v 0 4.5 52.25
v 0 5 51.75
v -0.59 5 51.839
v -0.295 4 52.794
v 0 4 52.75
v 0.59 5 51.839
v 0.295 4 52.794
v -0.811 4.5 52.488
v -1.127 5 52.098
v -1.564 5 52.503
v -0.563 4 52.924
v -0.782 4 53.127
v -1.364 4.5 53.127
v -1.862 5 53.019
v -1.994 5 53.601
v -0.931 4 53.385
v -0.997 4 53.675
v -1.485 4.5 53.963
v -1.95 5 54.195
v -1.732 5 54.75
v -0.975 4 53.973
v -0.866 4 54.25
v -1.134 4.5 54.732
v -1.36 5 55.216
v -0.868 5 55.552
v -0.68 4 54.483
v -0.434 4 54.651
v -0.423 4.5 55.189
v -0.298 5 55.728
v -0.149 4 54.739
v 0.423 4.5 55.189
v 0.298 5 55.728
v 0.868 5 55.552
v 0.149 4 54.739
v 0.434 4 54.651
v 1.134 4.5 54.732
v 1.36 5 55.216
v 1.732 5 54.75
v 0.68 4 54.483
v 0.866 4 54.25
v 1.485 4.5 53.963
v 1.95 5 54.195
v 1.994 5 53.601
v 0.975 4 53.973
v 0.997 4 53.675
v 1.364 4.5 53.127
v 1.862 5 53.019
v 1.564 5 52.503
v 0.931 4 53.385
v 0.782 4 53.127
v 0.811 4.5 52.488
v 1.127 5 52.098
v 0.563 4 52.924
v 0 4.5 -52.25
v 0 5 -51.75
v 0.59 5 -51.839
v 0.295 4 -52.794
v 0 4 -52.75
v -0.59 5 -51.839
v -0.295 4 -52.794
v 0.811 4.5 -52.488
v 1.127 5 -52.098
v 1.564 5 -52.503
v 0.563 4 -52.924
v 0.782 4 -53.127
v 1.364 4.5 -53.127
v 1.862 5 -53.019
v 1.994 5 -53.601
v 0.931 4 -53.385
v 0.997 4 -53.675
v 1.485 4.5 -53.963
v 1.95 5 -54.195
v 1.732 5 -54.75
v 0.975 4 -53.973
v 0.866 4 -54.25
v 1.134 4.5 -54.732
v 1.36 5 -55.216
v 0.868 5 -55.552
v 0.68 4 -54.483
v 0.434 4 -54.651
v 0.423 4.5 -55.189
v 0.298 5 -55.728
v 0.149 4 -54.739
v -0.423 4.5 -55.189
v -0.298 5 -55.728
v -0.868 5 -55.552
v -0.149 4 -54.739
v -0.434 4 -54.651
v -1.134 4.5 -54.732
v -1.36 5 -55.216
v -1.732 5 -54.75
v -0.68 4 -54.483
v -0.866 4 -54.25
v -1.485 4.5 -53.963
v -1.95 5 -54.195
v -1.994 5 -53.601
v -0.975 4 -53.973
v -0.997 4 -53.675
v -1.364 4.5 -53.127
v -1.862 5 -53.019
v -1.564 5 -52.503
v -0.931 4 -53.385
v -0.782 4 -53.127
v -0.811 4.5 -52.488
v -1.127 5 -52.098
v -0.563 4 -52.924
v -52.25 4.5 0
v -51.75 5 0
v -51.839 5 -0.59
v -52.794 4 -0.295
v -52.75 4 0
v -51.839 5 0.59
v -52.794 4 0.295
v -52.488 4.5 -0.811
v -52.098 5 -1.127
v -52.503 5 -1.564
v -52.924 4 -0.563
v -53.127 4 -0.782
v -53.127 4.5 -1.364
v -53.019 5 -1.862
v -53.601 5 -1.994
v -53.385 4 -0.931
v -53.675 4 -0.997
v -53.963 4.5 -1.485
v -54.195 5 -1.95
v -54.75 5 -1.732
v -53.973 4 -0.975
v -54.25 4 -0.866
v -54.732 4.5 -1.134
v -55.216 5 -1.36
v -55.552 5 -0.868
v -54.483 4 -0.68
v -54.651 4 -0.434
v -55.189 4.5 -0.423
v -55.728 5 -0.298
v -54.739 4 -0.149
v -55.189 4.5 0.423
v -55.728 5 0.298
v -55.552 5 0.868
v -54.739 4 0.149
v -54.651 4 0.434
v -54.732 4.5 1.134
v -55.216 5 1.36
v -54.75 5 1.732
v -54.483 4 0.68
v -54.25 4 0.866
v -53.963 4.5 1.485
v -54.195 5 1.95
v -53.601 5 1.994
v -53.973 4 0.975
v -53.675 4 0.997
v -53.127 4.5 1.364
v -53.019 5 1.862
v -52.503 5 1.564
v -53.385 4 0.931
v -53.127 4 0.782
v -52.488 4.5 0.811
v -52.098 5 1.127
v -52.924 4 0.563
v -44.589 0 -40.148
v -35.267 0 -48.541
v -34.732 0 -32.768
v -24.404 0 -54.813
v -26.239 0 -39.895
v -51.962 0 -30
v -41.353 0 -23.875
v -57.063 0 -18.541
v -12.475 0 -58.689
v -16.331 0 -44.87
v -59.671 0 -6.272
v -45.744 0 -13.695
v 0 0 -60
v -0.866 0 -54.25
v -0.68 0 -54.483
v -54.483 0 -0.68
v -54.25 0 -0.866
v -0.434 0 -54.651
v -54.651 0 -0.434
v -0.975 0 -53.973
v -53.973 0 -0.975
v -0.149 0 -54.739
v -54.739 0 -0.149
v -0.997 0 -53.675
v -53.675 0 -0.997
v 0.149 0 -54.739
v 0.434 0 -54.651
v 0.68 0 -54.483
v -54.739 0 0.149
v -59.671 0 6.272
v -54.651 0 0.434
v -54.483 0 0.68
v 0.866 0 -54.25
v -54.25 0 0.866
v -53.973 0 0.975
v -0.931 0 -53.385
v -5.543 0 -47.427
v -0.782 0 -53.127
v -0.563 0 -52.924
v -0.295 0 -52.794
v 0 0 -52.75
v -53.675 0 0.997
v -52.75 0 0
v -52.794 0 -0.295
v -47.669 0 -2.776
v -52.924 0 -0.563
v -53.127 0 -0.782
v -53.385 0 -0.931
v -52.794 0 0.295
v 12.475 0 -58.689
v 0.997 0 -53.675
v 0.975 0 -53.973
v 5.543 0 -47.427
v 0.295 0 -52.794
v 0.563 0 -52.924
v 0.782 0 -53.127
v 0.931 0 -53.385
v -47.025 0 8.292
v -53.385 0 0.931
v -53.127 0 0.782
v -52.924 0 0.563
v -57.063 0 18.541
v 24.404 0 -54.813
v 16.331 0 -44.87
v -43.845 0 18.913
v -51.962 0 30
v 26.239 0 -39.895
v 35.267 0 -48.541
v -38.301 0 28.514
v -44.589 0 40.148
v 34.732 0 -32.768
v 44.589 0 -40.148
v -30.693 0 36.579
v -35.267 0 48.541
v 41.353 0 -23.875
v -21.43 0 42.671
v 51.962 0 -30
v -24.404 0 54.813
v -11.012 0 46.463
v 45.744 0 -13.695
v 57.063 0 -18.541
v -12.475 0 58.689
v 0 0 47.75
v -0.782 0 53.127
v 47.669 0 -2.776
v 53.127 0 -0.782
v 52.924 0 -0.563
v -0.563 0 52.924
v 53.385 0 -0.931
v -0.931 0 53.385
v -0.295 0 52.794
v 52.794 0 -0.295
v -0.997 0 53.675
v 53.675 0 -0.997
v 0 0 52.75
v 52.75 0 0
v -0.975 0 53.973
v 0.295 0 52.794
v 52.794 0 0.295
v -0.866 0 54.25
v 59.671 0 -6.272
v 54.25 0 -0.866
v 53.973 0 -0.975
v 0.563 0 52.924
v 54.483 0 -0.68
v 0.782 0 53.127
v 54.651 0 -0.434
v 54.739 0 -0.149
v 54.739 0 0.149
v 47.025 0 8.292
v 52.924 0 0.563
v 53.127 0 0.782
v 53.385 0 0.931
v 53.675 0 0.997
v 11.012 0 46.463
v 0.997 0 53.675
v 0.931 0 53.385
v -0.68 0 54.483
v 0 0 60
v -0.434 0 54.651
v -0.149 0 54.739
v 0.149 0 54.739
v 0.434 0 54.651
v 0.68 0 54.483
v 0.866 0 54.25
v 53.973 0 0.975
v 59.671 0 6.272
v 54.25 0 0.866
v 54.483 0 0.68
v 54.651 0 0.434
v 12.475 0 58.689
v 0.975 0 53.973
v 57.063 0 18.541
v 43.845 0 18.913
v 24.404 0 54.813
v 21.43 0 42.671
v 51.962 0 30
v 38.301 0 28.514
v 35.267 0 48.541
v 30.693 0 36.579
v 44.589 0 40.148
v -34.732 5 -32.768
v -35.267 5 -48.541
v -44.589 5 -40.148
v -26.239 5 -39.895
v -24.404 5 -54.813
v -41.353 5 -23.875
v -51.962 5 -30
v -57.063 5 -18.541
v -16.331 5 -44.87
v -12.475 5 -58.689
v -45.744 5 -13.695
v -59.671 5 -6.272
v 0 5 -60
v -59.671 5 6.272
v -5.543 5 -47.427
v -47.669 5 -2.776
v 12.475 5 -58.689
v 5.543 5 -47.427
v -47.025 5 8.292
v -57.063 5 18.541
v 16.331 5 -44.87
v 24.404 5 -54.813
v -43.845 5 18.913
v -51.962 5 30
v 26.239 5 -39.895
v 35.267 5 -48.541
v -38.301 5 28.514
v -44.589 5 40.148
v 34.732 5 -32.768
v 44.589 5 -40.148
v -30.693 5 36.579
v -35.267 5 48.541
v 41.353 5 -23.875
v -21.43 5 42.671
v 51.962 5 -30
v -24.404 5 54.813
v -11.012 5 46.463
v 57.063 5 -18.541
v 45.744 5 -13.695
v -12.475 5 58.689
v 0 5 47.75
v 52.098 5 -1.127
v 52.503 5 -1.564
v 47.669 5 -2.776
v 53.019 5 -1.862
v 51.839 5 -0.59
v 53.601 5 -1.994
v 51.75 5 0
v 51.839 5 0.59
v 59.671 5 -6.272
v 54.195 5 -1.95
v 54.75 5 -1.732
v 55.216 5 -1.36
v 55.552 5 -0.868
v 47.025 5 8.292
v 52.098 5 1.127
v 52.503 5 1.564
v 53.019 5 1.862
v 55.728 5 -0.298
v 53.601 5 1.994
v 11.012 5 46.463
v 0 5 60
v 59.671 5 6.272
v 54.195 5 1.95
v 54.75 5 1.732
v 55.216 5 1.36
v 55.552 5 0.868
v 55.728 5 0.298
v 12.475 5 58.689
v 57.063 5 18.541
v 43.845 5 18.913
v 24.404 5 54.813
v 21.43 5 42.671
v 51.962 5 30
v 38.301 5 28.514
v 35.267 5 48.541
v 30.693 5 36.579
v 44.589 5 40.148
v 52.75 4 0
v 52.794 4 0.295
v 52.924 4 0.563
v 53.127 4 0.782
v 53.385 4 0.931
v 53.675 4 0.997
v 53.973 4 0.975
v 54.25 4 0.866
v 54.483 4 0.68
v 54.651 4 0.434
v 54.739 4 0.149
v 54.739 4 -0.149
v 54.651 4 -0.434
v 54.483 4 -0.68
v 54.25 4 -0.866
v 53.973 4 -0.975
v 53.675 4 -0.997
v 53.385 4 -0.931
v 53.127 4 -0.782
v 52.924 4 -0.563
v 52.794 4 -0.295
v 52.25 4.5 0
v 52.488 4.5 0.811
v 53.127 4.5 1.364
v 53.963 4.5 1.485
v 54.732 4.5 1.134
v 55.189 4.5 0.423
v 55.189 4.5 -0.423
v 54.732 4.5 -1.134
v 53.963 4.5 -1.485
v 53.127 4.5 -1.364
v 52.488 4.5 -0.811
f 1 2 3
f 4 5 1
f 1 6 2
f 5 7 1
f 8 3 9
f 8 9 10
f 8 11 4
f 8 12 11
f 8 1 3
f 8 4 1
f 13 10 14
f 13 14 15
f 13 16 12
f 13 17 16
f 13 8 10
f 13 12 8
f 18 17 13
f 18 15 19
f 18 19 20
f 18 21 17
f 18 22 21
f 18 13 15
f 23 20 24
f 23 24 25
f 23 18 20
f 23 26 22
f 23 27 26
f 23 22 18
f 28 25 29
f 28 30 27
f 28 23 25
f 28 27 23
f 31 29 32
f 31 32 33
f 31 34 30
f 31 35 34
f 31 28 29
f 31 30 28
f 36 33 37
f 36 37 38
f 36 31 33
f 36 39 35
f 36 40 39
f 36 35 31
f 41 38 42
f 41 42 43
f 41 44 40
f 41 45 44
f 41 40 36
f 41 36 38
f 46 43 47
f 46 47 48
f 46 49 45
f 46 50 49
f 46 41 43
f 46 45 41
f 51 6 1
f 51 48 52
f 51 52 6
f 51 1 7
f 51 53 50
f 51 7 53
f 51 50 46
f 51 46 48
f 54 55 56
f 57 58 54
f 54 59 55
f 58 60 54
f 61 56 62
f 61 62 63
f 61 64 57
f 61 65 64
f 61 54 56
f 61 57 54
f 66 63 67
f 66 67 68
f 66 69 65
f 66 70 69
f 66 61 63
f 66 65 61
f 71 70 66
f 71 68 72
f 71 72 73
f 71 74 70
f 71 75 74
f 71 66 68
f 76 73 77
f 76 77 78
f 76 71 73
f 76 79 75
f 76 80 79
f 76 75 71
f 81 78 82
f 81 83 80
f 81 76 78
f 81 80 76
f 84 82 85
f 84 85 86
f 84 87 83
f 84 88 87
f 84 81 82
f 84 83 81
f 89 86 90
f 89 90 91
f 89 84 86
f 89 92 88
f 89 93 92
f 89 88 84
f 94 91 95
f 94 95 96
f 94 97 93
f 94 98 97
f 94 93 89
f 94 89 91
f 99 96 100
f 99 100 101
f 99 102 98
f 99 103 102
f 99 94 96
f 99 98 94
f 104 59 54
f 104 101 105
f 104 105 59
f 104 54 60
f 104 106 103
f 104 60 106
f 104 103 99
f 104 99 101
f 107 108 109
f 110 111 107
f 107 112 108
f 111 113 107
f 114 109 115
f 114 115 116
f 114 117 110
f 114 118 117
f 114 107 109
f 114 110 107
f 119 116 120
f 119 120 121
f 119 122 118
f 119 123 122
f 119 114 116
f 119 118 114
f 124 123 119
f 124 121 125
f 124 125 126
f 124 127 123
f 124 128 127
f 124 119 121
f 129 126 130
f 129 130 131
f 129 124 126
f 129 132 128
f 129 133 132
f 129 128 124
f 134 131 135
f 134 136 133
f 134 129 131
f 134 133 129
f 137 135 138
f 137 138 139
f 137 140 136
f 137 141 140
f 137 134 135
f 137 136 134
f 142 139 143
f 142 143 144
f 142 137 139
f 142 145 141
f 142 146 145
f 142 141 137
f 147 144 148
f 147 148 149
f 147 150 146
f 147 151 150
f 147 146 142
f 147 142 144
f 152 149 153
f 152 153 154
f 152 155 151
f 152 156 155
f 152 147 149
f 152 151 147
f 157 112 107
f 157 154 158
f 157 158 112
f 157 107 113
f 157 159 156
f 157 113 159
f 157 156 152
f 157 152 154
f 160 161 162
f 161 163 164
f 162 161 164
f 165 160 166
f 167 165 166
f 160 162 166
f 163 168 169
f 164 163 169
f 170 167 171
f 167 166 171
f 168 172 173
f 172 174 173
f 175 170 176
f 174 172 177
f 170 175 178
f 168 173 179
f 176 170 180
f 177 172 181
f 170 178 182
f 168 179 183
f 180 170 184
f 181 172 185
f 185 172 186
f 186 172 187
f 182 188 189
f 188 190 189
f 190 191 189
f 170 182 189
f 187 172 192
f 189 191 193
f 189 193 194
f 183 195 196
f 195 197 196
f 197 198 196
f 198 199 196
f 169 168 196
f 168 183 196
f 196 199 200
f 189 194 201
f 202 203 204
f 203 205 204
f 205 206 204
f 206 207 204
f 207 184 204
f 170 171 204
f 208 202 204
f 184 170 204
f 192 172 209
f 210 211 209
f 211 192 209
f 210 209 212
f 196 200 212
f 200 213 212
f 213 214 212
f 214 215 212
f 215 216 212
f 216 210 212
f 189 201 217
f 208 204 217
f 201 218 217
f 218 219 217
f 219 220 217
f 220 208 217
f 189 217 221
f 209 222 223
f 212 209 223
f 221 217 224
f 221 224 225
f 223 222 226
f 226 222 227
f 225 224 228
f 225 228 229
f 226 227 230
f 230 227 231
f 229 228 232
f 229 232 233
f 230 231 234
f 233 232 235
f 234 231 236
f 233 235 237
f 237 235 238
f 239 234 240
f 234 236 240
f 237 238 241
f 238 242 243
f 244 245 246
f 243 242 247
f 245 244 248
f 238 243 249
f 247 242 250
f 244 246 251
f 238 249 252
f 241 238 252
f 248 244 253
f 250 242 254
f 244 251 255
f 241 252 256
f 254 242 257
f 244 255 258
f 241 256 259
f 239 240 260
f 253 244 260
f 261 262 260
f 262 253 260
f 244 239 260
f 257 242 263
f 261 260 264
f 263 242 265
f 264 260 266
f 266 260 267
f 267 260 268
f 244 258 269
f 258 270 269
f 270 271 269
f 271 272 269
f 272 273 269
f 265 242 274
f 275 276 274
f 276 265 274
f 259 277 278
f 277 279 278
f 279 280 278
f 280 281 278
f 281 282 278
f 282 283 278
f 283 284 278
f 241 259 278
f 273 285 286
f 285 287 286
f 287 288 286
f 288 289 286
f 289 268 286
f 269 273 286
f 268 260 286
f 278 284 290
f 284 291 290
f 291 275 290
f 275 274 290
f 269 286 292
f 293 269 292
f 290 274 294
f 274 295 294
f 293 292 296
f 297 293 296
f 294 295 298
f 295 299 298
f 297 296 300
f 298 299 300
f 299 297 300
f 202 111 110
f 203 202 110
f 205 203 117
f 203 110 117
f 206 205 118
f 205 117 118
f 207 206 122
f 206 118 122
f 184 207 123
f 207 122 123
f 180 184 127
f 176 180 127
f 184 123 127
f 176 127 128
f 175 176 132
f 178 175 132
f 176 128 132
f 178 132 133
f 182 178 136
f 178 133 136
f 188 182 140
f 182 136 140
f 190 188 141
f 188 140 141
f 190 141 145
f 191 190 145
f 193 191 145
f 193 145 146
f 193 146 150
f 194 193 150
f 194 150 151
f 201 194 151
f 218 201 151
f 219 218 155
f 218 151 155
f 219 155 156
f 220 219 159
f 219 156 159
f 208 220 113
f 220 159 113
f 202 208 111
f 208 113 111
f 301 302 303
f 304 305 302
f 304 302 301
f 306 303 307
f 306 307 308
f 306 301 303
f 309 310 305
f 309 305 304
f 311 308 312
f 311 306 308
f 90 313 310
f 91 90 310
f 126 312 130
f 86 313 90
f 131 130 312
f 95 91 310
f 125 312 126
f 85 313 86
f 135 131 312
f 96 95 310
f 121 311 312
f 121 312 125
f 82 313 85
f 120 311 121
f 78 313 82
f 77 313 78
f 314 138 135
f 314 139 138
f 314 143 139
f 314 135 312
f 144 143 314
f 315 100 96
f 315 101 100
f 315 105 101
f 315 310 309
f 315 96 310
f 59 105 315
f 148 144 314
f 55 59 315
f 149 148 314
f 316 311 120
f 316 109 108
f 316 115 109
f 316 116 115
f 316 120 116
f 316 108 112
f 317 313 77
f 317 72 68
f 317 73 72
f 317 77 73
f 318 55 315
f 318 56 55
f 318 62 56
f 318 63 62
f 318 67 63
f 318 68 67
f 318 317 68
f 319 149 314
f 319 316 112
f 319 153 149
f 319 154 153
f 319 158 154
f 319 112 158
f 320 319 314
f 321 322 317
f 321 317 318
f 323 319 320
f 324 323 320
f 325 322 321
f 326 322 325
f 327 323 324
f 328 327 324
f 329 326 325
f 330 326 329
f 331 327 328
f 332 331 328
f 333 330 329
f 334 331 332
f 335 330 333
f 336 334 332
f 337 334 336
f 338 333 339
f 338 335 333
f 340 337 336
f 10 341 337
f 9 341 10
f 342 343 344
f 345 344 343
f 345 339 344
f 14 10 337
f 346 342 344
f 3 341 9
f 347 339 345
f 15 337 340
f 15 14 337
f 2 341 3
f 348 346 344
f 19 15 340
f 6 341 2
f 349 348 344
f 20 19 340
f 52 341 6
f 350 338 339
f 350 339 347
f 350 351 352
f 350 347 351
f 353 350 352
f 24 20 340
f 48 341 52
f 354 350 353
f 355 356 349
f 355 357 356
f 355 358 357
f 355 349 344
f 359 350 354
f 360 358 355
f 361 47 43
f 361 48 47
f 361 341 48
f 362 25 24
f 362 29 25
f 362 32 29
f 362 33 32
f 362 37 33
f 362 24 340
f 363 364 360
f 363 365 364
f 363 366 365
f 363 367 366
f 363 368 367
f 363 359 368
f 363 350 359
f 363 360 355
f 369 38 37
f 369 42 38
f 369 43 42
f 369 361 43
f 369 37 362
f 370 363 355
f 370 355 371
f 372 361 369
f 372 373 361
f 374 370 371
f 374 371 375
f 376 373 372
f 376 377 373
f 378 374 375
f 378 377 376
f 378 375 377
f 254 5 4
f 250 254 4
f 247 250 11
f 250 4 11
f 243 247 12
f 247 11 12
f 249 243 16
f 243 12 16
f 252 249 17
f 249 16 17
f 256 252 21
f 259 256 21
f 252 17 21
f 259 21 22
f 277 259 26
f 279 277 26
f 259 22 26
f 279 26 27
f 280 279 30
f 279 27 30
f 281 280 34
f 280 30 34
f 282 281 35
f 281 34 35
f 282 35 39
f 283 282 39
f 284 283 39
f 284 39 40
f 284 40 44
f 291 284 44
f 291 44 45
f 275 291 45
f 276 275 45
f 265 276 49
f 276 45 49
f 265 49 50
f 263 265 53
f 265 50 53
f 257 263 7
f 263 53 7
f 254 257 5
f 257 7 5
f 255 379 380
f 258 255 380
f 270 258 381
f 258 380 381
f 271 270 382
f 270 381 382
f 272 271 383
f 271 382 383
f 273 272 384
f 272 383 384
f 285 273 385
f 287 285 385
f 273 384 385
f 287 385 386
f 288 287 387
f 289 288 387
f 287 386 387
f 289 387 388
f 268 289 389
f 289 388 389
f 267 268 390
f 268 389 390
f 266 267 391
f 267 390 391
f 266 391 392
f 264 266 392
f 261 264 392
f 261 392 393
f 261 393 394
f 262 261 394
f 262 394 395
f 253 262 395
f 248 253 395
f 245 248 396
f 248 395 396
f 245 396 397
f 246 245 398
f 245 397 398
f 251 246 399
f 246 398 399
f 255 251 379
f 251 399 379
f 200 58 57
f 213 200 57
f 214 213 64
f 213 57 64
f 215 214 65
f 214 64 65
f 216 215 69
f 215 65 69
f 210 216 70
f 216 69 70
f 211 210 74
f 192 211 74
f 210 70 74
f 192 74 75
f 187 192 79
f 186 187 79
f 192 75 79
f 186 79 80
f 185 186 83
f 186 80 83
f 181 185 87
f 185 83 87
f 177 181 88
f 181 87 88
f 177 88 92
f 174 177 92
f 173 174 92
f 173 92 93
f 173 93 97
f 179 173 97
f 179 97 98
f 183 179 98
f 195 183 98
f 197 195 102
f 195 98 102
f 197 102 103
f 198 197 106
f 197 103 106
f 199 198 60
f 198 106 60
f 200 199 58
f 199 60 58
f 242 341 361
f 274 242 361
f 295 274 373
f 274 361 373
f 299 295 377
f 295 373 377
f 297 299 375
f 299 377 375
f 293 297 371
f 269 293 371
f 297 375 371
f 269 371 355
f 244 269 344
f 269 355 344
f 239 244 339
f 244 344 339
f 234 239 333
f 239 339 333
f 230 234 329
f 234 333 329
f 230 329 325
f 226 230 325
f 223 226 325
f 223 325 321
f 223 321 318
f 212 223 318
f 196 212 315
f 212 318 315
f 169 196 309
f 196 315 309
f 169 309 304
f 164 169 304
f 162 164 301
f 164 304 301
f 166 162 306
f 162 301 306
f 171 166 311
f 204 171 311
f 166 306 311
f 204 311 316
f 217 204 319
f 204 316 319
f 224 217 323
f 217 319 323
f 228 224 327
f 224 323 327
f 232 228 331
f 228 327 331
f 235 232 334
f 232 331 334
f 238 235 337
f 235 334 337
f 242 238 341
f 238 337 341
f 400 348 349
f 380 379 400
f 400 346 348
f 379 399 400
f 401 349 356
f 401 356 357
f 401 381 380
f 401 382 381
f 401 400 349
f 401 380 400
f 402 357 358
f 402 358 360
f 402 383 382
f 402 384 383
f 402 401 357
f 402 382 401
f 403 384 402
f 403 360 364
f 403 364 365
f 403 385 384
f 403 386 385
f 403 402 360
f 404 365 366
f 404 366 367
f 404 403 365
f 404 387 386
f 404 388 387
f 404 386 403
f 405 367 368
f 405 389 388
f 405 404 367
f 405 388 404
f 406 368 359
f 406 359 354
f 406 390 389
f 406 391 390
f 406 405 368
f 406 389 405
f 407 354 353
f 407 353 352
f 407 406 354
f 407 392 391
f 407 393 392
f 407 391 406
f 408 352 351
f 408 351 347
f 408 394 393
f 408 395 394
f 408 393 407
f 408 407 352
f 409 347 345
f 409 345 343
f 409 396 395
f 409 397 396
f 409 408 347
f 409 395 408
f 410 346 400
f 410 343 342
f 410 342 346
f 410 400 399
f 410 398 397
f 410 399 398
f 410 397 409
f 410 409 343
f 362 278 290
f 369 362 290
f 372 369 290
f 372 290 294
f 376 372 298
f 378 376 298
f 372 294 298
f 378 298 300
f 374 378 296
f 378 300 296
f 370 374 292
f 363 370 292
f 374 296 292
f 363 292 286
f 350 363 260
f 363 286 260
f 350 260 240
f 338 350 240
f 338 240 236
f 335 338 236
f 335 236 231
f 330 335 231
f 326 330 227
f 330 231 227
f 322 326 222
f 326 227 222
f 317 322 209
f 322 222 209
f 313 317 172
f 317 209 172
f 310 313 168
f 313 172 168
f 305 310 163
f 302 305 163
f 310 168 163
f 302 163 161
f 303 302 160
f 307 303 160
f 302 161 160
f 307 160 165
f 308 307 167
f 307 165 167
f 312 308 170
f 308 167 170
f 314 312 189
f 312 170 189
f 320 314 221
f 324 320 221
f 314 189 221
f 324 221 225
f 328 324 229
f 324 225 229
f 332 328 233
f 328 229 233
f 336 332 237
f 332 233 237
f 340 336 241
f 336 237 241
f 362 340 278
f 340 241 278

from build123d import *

# Parameters (mm, degrees)
SKETCH1_R                    = 60
BOSS_EXTRUDE1_DEPTH          = 5
SKETCH2_R                    = 1
CUT_EXTRUDE1_DEPTH           = 5
CHAMFER1_SIZE                = 1
CIRPATTERN1_COUNT            = 4
CHAMFER1_OF_CIRPATTERN1_SIZE = 1
SKETCH3_R                    = 47.75
CUT_EXTRUDE2_DEPTH           = 5


with BuildPart() as part:
    # Sketch1 → Boss-Extrude1 (new body)
    with BuildSketch(Plane(origin=(0, 0, 0), x_dir=(1, 0, 0), z_dir=(0, 1, 0))):
        with Locations(Location((0, 0, 0), (0, 0, 270))):
            Circle(SKETCH1_R)
    extrude(amount=BOSS_EXTRUDE1_DEPTH)

    # Sketch2 → Cut-Extrude1 (cut)
    with BuildSketch(Plane(origin=(0, 5, 0), x_dir=(1, 0, 0), z_dir=(0, 1, 0))):
        with Locations(Location((0, 53.75, 0), (0, 0, 270))):
            Circle(SKETCH2_R)
    cut_extrude1 = extrude(amount=-CUT_EXTRUDE1_DEPTH, mode=Mode.SUBTRACT)

    # Chamfer1
    chamfer1_edges = [part.edges().sort_by_distance(p)[0] for p in [
        (0, 5, -54.75),
    ]]
    chamfer(chamfer1_edges, length=CHAMFER1_SIZE)

    # CirPattern1: Cut-Extrude1 ×4 about axis
    cirpattern1_axis = Axis((0, 0, 0), (0, 1, 0))
    for i in range(1, CIRPATTERN1_COUNT):
        add(cut_extrude1.rotate(cirpattern1_axis, i * 360 / CIRPATTERN1_COUNT), mode=Mode.SUBTRACT)

    # Chamfer1 of CirPattern1
    chamfer1_of_cirpattern1_edges = [part.edges().sort_by_distance(p)[0] for p in [
        (-54.75, 5, 0),
        (0, 5, 54.75),
        (54.75, 5, 0),
    ]]
    chamfer(chamfer1_of_cirpattern1_edges, length=CHAMFER1_OF_CIRPATTERN1_SIZE)

    # Sketch3 → Cut-Extrude2 (cut)
    with BuildSketch(Plane(origin=(0, 5, 0), x_dir=(1, 0, 0), z_dir=(0, 1, 0))):
        with Locations(Location((0, 0, 0), (0, 0, 270))):
            Circle(SKETCH3_R)
    extrude(amount=-CUT_EXTRUDE2_DEPTH, mode=Mode.SUBTRACT)


solid = part.part
